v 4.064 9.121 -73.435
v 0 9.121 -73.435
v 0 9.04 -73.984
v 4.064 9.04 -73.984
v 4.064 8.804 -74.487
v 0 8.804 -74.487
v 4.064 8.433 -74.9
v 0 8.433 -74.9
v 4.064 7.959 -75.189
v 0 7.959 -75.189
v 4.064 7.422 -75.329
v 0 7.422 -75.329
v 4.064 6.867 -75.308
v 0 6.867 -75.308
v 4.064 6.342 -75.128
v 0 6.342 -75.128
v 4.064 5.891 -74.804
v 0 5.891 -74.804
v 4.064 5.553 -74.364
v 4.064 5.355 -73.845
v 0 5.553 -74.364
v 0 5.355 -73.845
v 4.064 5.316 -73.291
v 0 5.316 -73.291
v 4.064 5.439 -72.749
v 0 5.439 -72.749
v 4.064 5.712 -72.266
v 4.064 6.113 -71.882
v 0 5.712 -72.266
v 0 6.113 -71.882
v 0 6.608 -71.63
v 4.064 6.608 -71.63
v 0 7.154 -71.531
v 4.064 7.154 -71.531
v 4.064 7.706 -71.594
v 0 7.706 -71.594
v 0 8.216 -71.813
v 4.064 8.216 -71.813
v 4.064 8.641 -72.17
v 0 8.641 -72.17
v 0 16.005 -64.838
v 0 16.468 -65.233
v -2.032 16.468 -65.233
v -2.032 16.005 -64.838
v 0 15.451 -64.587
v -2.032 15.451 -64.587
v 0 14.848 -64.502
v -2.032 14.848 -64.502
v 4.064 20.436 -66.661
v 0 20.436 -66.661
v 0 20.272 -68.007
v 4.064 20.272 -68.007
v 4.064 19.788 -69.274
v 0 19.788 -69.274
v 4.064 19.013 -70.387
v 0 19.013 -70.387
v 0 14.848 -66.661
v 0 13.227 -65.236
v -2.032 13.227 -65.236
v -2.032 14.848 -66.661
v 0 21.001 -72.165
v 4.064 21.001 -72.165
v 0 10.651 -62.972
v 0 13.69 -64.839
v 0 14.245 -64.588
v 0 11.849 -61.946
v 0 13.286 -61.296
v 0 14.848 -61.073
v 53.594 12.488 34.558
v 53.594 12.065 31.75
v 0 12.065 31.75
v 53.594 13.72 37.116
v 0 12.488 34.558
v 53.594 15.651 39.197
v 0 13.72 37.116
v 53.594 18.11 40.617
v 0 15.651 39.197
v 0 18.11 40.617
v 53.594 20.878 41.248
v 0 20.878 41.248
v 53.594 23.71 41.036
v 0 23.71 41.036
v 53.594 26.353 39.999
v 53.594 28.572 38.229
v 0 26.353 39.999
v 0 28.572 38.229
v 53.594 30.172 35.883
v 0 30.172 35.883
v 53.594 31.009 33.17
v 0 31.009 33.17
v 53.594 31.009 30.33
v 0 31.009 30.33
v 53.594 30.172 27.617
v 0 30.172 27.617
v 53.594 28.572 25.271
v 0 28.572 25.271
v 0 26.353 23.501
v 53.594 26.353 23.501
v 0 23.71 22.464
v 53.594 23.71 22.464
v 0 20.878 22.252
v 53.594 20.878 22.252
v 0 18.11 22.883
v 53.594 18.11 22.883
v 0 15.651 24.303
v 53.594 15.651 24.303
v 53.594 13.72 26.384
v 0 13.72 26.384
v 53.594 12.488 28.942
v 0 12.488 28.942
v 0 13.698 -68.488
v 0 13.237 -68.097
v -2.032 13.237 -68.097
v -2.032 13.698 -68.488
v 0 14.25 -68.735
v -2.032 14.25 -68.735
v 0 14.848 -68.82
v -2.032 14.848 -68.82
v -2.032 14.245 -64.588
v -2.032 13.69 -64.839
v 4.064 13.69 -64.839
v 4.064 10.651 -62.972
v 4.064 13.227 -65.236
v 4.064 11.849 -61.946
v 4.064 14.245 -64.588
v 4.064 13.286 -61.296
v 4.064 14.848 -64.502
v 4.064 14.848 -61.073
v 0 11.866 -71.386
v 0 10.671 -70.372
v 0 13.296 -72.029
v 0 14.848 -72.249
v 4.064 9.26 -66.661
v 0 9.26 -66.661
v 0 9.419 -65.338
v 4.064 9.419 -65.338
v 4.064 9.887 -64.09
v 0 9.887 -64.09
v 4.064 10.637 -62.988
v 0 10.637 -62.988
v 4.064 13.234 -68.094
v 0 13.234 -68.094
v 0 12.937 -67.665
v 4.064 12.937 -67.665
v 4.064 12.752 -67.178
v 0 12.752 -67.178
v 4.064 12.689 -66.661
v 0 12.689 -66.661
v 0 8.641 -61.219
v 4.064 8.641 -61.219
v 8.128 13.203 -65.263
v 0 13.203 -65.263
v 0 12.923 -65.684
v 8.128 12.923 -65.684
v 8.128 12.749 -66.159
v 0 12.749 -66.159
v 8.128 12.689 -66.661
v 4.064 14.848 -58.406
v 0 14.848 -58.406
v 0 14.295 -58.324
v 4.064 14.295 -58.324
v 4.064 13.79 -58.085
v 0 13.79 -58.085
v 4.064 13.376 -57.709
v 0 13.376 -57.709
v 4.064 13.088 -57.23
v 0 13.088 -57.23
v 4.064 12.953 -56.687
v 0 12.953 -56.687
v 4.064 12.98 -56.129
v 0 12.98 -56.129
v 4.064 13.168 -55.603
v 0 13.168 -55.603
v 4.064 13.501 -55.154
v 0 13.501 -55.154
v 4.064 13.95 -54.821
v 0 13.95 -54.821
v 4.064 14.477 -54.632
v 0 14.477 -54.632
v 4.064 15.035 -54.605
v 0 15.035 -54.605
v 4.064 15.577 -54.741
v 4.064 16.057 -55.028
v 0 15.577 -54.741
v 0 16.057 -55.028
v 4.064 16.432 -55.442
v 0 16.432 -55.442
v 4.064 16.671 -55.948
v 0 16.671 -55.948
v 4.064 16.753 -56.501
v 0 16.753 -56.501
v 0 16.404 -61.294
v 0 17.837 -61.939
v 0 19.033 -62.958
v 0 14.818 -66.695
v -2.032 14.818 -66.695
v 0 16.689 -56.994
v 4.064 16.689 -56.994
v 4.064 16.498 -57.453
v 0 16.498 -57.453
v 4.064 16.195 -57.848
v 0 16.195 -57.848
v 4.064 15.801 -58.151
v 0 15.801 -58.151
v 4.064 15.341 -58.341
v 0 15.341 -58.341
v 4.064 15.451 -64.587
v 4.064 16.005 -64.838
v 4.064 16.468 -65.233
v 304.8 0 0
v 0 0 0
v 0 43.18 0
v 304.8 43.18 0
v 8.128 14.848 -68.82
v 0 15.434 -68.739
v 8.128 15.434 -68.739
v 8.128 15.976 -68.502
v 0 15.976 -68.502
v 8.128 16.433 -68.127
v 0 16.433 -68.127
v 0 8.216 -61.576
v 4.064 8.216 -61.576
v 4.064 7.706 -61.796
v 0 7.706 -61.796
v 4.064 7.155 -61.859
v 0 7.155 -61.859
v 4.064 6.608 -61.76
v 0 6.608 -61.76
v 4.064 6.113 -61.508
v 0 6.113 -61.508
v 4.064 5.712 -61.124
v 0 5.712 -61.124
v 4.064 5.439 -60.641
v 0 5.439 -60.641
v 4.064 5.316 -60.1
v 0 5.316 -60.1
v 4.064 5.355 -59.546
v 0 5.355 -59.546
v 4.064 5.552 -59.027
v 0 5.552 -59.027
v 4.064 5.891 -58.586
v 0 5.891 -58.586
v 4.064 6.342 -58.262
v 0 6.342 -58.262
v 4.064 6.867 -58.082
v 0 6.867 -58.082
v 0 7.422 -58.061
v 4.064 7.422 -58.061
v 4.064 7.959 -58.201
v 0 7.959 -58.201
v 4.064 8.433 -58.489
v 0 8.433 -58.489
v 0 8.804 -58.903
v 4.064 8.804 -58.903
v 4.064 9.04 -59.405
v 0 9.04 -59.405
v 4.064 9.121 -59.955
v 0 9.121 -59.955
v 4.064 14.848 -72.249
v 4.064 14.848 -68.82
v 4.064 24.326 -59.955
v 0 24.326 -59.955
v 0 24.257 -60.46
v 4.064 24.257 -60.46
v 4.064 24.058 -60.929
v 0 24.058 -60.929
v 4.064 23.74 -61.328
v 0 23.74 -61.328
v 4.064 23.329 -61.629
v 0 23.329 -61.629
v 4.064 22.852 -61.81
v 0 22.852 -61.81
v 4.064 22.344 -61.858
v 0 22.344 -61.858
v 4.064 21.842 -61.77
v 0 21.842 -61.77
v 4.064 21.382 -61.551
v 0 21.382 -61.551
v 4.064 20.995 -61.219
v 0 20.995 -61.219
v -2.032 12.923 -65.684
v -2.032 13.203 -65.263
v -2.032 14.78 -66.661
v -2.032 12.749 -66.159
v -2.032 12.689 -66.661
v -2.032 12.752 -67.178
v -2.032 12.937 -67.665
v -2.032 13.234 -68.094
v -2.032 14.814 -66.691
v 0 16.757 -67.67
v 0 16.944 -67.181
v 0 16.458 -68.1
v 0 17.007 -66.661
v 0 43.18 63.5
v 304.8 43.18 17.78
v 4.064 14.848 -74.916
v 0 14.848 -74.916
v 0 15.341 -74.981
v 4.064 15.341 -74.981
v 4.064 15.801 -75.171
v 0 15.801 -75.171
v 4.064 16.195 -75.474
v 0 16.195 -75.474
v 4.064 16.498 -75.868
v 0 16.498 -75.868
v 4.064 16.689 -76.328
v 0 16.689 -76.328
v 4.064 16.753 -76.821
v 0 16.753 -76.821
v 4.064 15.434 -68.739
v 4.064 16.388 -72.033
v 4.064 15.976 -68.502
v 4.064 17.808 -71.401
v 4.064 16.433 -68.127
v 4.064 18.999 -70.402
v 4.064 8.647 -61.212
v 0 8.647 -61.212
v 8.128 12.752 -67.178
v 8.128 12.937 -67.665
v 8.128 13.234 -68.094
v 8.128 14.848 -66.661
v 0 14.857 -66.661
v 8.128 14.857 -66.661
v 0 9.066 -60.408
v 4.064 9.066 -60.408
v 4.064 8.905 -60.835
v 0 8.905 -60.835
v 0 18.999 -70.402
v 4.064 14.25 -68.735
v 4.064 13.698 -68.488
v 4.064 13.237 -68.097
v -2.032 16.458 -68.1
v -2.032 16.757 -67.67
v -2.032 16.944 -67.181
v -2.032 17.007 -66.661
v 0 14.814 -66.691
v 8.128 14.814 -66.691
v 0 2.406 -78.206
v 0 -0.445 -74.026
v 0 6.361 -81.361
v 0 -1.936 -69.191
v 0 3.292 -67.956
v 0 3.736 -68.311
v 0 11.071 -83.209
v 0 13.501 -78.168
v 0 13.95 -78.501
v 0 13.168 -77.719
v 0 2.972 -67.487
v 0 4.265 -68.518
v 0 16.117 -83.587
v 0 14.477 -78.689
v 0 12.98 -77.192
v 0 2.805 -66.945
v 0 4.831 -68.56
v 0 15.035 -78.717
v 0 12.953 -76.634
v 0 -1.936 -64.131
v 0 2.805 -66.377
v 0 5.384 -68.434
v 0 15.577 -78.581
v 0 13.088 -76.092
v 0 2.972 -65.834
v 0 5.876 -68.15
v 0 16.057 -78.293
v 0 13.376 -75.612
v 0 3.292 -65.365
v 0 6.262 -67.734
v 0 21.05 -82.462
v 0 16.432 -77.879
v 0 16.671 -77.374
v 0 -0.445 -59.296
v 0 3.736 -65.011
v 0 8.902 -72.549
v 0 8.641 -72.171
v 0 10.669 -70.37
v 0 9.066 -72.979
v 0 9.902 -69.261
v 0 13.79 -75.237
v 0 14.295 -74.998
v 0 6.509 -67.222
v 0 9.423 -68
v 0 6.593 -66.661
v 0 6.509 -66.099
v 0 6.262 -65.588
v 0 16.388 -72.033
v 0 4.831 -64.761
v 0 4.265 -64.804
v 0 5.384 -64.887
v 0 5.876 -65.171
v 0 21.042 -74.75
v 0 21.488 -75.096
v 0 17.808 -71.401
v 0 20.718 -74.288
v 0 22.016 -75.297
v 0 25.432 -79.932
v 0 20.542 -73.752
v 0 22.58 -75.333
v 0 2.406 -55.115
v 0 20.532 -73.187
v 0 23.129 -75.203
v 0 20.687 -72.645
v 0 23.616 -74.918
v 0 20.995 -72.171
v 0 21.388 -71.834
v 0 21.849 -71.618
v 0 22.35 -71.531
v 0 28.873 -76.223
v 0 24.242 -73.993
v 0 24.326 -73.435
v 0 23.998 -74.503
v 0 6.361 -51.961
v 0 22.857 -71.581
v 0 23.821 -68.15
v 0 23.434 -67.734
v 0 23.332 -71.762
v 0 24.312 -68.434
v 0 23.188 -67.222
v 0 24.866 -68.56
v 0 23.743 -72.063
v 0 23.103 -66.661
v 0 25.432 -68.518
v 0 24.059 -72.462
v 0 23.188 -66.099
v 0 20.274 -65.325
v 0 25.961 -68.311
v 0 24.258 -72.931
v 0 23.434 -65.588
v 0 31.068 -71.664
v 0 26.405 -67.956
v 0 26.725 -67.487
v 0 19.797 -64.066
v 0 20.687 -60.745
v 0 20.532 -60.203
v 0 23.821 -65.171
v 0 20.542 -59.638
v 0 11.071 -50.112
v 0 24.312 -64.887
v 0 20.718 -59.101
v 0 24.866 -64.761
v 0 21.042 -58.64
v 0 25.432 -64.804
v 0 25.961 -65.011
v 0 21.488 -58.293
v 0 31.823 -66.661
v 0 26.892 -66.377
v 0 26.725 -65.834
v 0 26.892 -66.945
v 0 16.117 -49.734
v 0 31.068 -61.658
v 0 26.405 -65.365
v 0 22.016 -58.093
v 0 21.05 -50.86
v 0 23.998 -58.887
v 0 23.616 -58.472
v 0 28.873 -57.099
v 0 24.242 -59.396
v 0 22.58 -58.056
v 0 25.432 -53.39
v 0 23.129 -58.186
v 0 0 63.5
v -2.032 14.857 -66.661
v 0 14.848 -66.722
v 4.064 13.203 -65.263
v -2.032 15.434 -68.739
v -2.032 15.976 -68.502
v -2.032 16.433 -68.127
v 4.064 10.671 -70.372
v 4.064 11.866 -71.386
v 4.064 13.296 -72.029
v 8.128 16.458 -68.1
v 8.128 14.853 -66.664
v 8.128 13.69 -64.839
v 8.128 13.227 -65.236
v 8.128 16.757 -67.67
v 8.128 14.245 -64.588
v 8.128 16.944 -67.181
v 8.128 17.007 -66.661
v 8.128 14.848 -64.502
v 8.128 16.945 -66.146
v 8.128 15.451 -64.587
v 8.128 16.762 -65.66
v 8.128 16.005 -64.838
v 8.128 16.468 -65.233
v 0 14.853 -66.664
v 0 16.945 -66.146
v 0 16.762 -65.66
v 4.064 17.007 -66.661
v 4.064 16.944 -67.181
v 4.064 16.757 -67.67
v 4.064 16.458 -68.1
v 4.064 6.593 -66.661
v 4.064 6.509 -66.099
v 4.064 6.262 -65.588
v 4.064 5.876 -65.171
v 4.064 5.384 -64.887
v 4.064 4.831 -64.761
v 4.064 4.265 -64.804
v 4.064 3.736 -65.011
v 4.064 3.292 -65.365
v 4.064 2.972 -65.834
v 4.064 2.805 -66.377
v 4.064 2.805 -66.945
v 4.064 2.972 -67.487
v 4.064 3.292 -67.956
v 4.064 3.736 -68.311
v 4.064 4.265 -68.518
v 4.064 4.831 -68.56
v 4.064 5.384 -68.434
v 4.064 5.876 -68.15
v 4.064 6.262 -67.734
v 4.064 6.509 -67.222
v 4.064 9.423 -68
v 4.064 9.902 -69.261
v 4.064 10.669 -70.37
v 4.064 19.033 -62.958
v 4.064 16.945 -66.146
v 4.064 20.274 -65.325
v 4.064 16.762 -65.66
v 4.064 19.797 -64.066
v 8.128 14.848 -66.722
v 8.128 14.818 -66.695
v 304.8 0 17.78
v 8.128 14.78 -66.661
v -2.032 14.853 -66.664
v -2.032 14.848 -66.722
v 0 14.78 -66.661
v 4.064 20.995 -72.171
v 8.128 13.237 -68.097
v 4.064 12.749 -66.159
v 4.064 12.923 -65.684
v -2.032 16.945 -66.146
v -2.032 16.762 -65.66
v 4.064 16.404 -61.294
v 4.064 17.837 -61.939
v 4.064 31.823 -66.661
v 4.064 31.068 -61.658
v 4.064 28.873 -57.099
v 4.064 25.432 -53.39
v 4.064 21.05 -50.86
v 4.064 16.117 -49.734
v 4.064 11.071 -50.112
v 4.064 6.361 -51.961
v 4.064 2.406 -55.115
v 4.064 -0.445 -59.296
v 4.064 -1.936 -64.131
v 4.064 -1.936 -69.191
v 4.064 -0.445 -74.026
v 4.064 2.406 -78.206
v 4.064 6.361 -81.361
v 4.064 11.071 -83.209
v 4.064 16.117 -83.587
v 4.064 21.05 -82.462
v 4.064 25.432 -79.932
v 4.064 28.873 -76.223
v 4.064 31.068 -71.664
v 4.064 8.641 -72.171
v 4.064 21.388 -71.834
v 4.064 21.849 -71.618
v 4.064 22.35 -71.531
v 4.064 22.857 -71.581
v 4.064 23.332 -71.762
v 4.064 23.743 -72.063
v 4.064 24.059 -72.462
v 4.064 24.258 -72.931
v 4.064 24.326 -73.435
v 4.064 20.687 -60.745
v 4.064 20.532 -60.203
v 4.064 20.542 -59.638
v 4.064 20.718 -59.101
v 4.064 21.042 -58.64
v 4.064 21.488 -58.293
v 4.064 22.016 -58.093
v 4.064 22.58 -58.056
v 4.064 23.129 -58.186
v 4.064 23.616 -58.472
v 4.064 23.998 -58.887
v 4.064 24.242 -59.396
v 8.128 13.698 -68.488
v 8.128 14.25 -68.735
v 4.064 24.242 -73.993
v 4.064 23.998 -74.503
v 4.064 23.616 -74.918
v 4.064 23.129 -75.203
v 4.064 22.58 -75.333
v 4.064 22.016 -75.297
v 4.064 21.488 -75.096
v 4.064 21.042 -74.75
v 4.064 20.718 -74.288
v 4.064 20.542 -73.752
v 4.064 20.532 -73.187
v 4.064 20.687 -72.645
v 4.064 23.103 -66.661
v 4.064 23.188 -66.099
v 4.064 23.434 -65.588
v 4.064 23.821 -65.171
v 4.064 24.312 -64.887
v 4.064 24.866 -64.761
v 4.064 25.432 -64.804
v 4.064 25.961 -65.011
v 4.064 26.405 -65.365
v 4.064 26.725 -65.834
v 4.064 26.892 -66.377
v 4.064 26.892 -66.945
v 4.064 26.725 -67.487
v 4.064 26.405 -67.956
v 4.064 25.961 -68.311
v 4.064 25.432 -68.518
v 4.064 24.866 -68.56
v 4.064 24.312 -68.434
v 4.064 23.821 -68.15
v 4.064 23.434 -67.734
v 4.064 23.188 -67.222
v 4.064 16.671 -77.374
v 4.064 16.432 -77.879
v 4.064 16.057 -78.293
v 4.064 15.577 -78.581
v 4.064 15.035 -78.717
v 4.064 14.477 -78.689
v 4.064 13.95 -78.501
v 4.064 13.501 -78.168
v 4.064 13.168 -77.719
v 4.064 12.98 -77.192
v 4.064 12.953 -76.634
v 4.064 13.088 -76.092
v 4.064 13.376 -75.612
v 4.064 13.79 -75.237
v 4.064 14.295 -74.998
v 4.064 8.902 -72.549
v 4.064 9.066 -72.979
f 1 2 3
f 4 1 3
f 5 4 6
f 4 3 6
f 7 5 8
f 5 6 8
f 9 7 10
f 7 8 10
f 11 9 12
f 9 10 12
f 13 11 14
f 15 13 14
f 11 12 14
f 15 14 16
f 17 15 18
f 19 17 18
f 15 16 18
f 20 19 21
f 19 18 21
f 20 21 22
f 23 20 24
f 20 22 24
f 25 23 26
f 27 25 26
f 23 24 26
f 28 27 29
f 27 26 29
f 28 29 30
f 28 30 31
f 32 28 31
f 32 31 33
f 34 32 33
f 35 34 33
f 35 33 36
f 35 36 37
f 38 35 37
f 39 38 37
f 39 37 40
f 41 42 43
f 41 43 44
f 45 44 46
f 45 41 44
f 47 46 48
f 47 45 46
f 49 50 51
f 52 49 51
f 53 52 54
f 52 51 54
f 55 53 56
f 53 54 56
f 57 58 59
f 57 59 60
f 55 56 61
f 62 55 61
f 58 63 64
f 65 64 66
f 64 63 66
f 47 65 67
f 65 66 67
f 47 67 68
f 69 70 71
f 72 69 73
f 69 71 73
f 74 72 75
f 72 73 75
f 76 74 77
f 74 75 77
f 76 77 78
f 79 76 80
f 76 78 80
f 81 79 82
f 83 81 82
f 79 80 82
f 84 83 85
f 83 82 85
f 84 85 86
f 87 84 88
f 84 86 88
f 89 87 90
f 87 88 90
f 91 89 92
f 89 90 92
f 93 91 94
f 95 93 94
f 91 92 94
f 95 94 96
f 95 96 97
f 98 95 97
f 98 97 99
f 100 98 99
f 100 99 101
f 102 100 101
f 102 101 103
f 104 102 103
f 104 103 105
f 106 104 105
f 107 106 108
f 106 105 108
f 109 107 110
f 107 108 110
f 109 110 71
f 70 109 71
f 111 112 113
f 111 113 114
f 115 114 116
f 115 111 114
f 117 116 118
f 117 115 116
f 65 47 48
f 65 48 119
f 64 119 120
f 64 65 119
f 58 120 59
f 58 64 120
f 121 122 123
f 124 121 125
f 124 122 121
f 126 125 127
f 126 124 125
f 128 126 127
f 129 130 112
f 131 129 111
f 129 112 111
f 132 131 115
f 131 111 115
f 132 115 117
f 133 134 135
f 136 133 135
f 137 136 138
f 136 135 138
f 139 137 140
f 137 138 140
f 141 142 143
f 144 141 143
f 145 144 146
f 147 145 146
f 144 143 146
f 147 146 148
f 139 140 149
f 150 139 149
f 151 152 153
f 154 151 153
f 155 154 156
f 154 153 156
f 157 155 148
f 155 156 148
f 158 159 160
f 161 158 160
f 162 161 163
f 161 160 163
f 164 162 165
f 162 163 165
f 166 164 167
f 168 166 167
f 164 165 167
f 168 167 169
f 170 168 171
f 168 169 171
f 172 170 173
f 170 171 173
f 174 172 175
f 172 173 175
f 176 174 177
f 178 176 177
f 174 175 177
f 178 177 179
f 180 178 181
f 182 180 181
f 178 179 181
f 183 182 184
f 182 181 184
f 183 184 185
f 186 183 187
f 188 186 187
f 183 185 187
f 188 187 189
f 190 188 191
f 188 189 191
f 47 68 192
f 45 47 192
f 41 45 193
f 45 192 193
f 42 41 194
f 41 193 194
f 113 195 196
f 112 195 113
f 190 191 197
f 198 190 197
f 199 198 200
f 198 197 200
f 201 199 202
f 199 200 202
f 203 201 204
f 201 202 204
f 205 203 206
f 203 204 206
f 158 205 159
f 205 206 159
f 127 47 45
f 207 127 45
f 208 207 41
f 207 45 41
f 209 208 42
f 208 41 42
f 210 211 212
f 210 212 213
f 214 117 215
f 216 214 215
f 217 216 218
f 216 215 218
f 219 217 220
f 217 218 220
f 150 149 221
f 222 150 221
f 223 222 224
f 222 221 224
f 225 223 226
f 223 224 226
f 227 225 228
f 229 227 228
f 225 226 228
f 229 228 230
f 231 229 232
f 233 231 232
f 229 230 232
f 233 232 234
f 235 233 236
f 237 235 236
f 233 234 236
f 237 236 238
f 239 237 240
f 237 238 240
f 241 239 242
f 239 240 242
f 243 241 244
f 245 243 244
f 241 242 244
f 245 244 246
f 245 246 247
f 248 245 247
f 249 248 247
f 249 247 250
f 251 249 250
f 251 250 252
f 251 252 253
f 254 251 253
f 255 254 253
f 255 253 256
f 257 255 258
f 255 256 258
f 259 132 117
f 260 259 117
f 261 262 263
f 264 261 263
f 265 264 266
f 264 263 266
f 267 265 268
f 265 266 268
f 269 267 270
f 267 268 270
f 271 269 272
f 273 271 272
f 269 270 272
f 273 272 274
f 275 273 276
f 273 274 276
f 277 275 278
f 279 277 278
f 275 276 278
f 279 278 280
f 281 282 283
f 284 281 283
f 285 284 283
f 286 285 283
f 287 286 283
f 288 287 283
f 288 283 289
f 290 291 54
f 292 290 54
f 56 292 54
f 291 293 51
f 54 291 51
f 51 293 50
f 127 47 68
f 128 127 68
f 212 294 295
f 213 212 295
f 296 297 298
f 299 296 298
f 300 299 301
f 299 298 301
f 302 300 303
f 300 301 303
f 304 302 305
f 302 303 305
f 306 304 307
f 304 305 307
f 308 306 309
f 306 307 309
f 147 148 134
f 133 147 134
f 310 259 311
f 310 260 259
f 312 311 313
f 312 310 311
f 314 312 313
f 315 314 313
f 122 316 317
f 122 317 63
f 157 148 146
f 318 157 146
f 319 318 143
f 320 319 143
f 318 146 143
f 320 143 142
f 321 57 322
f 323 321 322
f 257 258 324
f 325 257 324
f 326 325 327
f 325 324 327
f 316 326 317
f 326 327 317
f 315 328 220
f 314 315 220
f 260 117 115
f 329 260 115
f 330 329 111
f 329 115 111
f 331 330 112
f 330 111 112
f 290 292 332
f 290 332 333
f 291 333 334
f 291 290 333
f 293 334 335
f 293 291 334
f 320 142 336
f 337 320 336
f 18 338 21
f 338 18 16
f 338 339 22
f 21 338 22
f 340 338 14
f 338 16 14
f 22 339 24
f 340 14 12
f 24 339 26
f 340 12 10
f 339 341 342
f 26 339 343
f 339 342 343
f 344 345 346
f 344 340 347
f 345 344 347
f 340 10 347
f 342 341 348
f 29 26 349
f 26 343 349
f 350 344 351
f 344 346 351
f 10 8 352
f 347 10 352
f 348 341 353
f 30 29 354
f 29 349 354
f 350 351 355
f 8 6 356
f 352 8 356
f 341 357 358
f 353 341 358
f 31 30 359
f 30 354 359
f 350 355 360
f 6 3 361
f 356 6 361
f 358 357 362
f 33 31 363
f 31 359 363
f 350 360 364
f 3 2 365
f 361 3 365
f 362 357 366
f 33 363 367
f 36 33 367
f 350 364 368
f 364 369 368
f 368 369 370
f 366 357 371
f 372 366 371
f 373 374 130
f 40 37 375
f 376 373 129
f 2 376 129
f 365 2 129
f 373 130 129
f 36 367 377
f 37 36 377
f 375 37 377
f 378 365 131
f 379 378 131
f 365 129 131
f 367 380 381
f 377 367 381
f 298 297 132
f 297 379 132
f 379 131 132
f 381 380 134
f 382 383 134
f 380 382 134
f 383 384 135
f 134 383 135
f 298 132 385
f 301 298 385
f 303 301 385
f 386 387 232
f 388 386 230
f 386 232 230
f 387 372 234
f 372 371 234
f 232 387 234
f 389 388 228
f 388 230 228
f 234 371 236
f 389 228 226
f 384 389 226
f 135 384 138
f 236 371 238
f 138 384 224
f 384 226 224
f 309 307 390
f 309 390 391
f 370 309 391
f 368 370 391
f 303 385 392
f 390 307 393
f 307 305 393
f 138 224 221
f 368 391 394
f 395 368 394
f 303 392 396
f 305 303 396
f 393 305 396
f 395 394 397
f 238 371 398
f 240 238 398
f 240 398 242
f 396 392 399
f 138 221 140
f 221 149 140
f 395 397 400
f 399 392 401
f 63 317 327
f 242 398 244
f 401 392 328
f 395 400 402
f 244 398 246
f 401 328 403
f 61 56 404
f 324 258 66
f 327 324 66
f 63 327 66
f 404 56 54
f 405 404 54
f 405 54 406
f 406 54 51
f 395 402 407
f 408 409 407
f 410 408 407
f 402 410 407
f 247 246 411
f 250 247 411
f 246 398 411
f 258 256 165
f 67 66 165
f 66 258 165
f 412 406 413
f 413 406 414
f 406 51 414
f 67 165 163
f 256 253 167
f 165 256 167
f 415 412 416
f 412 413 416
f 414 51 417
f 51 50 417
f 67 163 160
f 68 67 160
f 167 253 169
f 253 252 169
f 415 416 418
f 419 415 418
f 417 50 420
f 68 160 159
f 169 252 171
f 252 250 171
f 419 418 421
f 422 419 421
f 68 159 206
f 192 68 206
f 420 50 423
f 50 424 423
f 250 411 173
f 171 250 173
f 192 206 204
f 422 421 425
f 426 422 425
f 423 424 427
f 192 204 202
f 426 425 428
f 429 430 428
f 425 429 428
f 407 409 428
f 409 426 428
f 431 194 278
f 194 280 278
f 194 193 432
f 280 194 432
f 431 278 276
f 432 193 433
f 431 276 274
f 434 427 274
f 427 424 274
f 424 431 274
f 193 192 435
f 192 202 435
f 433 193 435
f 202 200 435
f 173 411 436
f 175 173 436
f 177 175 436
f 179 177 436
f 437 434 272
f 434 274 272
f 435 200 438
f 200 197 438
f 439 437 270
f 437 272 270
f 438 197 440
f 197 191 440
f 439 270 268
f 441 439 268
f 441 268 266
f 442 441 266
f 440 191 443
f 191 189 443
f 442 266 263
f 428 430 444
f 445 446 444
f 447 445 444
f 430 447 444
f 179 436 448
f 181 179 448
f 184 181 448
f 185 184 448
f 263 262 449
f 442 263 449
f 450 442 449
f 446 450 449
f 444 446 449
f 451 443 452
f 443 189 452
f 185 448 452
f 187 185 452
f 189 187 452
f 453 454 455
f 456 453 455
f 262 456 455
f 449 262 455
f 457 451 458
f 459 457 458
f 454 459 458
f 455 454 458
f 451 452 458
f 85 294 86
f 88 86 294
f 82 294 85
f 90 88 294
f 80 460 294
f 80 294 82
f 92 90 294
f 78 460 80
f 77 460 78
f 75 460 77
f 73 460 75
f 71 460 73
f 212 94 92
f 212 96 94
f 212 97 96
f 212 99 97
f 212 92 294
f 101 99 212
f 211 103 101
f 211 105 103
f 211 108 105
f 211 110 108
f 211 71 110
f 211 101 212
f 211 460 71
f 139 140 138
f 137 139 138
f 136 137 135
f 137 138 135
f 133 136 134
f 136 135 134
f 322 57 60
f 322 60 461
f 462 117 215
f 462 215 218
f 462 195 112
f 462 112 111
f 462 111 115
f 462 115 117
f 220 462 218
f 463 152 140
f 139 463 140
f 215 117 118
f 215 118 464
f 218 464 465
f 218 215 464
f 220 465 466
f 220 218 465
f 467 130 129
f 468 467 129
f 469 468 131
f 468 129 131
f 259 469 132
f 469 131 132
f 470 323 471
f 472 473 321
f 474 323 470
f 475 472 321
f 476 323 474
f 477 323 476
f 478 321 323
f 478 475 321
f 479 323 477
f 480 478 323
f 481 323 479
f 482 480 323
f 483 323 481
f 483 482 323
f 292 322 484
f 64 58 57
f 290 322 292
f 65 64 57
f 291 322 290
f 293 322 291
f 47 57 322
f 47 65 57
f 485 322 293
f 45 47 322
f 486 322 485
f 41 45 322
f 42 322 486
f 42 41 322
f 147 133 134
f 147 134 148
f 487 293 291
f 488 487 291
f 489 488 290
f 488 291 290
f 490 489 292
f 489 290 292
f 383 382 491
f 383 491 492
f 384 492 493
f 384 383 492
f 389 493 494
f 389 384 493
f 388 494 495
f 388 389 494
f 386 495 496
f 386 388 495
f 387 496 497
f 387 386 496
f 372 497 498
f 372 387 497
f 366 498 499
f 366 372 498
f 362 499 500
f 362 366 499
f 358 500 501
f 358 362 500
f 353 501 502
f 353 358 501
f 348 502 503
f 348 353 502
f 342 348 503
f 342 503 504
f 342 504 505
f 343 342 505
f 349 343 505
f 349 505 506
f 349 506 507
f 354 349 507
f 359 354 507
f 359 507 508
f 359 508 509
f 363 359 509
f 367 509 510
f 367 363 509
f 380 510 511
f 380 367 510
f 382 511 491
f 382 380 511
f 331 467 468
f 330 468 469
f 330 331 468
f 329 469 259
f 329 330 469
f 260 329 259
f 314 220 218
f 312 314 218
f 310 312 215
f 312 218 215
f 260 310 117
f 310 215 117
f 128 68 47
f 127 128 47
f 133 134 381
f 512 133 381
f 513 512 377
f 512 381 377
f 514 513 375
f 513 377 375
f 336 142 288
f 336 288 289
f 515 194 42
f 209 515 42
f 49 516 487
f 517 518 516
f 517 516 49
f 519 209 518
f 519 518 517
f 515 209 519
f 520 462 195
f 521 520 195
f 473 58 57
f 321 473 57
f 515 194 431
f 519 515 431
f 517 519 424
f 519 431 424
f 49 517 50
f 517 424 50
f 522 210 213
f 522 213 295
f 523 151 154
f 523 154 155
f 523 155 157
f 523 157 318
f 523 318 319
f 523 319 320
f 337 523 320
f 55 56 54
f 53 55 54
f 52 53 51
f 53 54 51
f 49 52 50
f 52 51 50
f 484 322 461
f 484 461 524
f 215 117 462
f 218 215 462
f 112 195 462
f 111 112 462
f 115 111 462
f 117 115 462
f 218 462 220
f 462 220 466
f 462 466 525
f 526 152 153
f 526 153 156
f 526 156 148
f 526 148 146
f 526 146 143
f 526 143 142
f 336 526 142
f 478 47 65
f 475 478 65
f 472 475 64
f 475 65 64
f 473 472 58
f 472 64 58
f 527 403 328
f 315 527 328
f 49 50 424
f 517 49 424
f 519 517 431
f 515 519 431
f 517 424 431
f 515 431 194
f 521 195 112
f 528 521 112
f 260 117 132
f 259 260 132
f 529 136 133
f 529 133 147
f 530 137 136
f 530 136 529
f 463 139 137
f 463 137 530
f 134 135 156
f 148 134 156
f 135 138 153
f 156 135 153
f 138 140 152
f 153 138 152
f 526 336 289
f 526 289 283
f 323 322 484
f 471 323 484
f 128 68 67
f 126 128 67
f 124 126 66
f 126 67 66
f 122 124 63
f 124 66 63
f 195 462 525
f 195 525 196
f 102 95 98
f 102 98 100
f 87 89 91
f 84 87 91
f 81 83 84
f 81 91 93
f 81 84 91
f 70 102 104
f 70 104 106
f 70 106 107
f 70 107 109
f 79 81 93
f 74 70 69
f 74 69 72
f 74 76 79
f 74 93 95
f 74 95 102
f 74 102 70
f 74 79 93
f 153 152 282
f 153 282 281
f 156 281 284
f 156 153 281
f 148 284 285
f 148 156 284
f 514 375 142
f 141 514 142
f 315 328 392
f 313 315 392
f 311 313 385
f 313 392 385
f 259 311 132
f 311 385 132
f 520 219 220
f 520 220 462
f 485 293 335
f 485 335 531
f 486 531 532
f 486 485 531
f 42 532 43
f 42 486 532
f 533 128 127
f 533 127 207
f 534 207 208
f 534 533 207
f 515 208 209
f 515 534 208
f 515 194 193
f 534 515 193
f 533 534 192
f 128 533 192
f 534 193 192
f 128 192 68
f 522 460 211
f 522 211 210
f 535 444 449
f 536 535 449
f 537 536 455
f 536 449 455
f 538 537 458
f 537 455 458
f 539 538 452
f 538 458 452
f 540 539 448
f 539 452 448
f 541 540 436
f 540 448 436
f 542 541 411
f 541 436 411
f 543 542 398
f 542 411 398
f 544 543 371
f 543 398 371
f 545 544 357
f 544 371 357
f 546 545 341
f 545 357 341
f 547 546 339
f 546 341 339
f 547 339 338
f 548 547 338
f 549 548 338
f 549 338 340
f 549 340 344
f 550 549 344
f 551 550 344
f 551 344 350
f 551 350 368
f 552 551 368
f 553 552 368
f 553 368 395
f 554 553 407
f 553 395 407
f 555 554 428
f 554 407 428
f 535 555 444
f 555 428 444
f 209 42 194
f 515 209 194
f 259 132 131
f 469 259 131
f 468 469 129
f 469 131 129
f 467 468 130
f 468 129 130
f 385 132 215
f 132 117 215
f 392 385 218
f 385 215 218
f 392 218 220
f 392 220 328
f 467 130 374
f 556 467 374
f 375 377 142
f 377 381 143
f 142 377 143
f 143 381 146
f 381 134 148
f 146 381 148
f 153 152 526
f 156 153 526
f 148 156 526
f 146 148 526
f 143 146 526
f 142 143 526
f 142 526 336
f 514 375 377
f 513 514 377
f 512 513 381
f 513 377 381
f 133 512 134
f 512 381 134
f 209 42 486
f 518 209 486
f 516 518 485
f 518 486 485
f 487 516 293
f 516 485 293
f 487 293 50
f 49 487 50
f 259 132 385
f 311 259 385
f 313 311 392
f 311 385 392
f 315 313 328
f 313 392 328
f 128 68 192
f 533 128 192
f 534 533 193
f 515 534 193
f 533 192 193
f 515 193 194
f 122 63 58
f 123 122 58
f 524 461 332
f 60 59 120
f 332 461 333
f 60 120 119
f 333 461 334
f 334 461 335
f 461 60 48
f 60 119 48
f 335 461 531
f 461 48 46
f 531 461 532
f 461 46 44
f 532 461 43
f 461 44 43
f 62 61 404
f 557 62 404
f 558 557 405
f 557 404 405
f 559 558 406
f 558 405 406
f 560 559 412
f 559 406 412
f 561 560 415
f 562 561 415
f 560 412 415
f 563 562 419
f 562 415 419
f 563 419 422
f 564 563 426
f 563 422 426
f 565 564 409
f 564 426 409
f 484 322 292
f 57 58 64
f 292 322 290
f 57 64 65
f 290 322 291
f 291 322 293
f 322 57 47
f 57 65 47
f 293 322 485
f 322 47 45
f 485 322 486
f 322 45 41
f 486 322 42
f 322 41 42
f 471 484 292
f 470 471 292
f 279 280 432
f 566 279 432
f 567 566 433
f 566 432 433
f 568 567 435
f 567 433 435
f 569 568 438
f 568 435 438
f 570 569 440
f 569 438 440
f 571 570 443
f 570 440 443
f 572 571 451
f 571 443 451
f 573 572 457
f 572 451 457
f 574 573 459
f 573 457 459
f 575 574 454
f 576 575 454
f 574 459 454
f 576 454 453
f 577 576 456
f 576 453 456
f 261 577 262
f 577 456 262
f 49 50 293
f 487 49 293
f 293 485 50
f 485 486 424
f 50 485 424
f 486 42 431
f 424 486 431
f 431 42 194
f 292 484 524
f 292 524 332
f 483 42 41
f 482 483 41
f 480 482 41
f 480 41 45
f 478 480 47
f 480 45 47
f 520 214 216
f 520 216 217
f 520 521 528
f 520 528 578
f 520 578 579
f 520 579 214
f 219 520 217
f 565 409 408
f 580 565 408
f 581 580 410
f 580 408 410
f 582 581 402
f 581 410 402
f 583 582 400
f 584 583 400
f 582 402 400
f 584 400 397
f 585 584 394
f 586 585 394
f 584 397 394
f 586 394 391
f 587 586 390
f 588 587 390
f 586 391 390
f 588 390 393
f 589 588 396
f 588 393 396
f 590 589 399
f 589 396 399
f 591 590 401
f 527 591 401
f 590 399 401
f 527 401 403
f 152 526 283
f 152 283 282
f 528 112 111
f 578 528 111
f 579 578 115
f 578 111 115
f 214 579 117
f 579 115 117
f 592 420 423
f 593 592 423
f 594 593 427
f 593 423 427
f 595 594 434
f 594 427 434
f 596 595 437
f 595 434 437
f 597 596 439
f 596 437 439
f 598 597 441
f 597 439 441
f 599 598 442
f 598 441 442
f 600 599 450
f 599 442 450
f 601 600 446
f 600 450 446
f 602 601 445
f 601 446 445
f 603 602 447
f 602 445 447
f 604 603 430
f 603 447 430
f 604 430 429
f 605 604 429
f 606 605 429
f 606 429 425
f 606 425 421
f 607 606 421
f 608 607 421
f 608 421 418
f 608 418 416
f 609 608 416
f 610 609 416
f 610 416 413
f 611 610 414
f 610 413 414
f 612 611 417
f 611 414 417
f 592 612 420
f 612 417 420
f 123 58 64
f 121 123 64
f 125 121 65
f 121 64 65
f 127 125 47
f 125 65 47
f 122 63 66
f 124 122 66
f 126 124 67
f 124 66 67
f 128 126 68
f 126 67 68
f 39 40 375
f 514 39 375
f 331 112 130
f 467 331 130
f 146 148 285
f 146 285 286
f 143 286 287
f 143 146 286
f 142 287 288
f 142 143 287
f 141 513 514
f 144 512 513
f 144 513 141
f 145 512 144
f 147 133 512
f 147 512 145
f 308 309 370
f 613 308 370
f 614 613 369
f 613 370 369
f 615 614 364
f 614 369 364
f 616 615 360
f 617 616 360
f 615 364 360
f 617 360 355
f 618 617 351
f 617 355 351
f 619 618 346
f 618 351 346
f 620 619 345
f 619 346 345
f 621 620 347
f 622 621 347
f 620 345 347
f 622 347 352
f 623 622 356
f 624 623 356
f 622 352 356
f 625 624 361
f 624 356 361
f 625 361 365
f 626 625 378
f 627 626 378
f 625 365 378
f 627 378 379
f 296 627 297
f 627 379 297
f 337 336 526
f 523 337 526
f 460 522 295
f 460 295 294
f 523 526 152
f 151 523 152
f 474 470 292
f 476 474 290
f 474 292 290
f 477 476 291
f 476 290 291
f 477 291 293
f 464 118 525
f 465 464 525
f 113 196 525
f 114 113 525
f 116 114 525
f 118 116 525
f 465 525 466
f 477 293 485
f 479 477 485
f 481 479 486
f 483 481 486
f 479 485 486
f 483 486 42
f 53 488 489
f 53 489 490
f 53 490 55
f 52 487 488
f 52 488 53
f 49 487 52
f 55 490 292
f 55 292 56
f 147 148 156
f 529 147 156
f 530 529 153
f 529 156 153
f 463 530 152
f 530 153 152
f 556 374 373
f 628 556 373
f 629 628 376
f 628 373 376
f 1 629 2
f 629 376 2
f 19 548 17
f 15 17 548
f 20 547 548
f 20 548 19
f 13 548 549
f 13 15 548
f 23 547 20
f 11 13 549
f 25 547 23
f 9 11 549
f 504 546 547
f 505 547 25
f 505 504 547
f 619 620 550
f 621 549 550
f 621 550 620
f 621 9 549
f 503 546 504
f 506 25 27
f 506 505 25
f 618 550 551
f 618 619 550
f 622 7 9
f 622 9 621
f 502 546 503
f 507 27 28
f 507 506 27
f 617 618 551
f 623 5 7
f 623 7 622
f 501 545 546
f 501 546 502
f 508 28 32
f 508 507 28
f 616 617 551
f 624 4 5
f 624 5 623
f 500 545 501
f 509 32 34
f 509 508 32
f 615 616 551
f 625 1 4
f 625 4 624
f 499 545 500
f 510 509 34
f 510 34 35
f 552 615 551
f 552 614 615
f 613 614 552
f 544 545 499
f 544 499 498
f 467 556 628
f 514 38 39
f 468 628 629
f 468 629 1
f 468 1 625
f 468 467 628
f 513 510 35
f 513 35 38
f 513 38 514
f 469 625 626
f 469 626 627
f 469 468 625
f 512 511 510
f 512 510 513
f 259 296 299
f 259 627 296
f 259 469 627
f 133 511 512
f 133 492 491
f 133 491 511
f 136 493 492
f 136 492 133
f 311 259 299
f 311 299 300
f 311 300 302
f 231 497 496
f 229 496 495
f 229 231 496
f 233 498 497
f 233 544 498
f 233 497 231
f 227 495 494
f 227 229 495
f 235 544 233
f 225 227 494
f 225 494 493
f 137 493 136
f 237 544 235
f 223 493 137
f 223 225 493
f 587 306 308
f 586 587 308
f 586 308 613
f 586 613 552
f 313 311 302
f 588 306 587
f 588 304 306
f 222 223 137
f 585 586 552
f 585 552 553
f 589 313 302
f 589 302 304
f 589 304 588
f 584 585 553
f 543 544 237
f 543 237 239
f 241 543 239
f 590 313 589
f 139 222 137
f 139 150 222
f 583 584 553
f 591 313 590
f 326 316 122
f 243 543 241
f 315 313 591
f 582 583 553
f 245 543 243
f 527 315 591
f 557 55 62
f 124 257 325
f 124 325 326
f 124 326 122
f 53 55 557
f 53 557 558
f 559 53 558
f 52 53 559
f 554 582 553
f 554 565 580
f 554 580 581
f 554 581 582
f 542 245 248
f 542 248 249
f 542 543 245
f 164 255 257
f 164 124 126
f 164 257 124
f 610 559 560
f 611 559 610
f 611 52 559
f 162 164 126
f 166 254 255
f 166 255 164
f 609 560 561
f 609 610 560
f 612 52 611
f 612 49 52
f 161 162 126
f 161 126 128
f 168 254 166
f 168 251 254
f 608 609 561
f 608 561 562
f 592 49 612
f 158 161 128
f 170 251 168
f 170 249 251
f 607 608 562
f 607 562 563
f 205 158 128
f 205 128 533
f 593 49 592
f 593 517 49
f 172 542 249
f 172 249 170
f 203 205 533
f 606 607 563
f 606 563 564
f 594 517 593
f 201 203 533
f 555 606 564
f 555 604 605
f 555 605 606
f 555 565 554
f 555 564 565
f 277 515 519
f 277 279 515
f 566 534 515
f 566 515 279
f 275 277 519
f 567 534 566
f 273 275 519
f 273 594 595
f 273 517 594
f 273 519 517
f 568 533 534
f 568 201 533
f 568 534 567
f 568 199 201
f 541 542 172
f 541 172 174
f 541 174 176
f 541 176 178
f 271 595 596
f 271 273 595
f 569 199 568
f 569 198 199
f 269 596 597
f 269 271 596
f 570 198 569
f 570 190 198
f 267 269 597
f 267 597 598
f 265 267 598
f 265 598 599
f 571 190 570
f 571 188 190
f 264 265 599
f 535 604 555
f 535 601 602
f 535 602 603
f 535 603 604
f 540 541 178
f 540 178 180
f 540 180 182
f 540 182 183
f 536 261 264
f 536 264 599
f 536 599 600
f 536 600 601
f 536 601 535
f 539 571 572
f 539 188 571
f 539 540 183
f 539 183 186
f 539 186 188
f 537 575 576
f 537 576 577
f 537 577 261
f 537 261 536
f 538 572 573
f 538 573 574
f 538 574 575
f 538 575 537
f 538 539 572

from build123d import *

# Parameters (mm, degrees)
F1_DEPTH  = 43.18
F2_R      = 9.525
F3_DEPTH  = 53.594
F5_DEPTH  = 8.128
F4_R      = 16.9741536912
F4_R_2    = 1.905
F6_DEPTH  = 4.064
F7_DEPTH  = 4.064
F8_DEPTH  = 4.064
F9_DEPTH  = 4.064
F10_DEPTH = 4.064
F11_DEPTH = 4.064
F12_DEPTH = 4.064
F13_DEPTH = 4.064
F14_DEPTH = 4.064
F15_DEPTH = 2.032


with BuildPart() as f1:
    # F0 (on Front) → F1 (new body)
    with BuildSketch(Plane.XZ):
        Polygon((0, 63.5), (0, 0), (304.8, 0), (304.8, 17.78), align=None)
    extrude(amount=-F1_DEPTH)

    # F2 (on face) → F3 (cut)
    with BuildSketch(Plane(origin=(0, 0, 0), x_dir=(0, -1, 0), z_dir=(-1, 0, 0))):
        with Locations((-21.59, 31.75)):
            Circle(F2_R)
    extrude(amount=-F3_DEPTH, mode=Mode.SUBTRACT)


with BuildPart() as f5:
    # F4 (on Right) → F5 (new body)
    with BuildSketch(Plane.YZ):
        with BuildLine():
            ThreePointArc((14.8484487383, -68.8197386136), (15.7133385968, -68.6389313577), (16.43336661, -68.1267932988))
            Line((16.43336661, -68.1267932988), (14.8484487383, -66.7216335196))
            Line((14.8484487383, -66.7216335196), (14.8484487383, -68.8197386136))
        make_face()
        with BuildLine():
            ThreePointArc((13.2366369691, -68.0971730258), (13.9652672439, -68.6308328875), (14.8484487383, -68.8197386136))
            Line((14.8484487383, -68.8197386136), (14.8484487383, -66.7216335196))
            Line((14.8484487383, -66.7216335196), (14.8182970344, -66.6949015593))
            Line((14.8182970344, -66.6949015593), (13.2366369691, -68.0971730258))
        make_face()
    extrude(amount=F5_DEPTH)


with BuildPart() as f5b:
    # F4 (on Right) → F5, piece 2 (new body)
    with BuildSketch(Plane.YZ):
        with BuildLine():
            Line((14.8141250754, -66.6912027752), (14.7797637203, -66.6607386136))
            Line((14.7797637203, -66.6607386136), (12.6894487383, -66.6607386136))
            ThreePointArc((12.6894487383, -66.6607386136), (12.8300988197, -67.4272531966), (13.2337235006, -68.0938971557))
            Line((13.2337235006, -68.0938971557), (14.8141250754, -66.6912027752))
        make_face()
        with BuildLine():
            Line((12.6894487383, -66.6607386136), (14.7797637203, -66.6607386136))
            Line((14.7797637203, -66.6607386136), (13.203074548, -65.2628742518))
            ThreePointArc((13.203074548, -65.2628742518), (12.8219192077, -65.9161185349), (12.6894487383, -66.6607386136))
        make_face()
    extrude(amount=F5_DEPTH)


with BuildPart() as f5c:
    # F4 (on Right) → F5, piece 3 (new body)
    with BuildSketch(Plane.YZ):
        with BuildLine():
            Line((14.8484487383, -66.6607386136), (14.8484487383, -64.5017386136))
            ThreePointArc((14.8484487383, -64.5017386136), (13.9583180842, -64.6937743489), (13.2265356419, -65.2357196987))
            Line((13.2265356419, -65.2357196987), (14.8484487383, -66.6607386136))
        make_face()
        with BuildLine():
            Line((14.8568303485, -66.6607386136), (16.4676379723, -65.2326254442))
            ThreePointArc((16.4676379723, -65.2326254442), (15.7367011425, -64.692925445), (14.8484487383, -64.5017386136))
            Line((14.8484487383, -64.5017386136), (14.8484487383, -66.6607386136))
            Line((14.8484487383, -66.6607386136), (14.8568303485, -66.6607386136))
        make_face()
        with BuildLine():
            Line((14.8568303485, -66.6607386136), (17.0074487383, -66.6607386136))
            ThreePointArc((17.0074487383, -66.6607386136), (16.8679920723, -65.8973738764), (16.4676379723, -65.2326254442))
            Line((16.4676379723, -65.2326254442), (14.8568303485, -66.6607386136))
        make_face()
        with BuildLine():
            ThreePointArc((16.4575149968, -68.1002478271), (16.8652847569, -67.431227727), (17.0074487383, -66.6607386136))
            Line((17.0074487383, -66.6607386136), (14.8568303485, -66.6607386136))
            Line((14.8568303485, -66.6607386136), (14.8526206226, -66.6644708812))
            Line((14.8526206226, -66.6644708812), (16.4575149968, -68.1002478271))
        make_face()
    extrude(amount=F5_DEPTH)


with BuildPart() as f6:
    # F4 (on Right) → F6 (new body)
    with BuildSketch(Plane.YZ):
        with Locations((14.8484487383, -66.6607386136)):
            Circle(F4_R)
        with BuildLine():
            ThreePointArc((19.0334446835, -62.9578271998), (20.0739392101, -64.680841311), (20.4364487383, -66.6607386136))
            ThreePointArc((20.4364487383, -66.6607386136), (20.0684949042, -68.6549457307), (19.0130908192, -70.3865271661))
            Line((19.0130908192, -70.3865271661), (21.000913203, -72.1648806808))
            ThreePointArc((21.000913203, -72.1648806808), (23.1005208841, -71.6554746762), (24.3256775488, -73.4350358691))
            ThreePointArc((24.3256775488, -73.4350358691), (21.744826341, -75.2161170422), (20.9952312023, -72.171260686))
            Line((20.9952312023, -72.171260686), (18.9993908505, -70.4017844007))
            ThreePointArc((18.9993908505, -70.4017844007), (17.1200979346, -71.7661625851), (14.8484487383, -72.2487386136))
            ThreePointArc((14.8484487383, -72.2487386136), (12.5585387057, -71.7579982737), (10.6708302578, -70.3719712702))
            Line((10.6708302578, -70.3719712702), (8.6413628665, -72.171260686))
            ThreePointArc((8.6413628665, -72.171260686), (8.9969976931, -72.7591846614), (9.1209165201, -73.4350358691))
            ThreePointArc((9.1209165201, -73.4350358691), (5.435019533, -74.1113722659), (8.6406740827, -72.1704842144))
            Line((8.6406740827, -72.1704842144), (10.6691598878, -70.3700901343))
            ThreePointArc((10.6691598878, -70.3700901343), (9.624484243, -68.6446587107), (9.2604487383, -66.6607386136))
            ThreePointArc((9.2604487383, -66.6607386136), (9.6159044991, -64.6995591765), (10.6370503075, -62.9878831499))
            Line((10.6370503075, -62.9878831499), (8.6413628665, -61.2185424325))
            ThreePointArc((8.6413628665, -61.2185424325), (5.434835347, -59.2789160417), (9.1209165201, -59.9547672494))
            ThreePointArc((9.1209165201, -59.9547672494), (8.9985087479, -60.6266228508), (8.647016311, -61.2121368802))
            Line((8.647016311, -61.2121368802), (10.6505560183, -62.9724543633))
            ThreePointArc((10.6505560183, -62.9724543633), (12.544581163, -61.5697722814), (14.8484487383, -61.0727386136))
            ThreePointArc((14.8484487383, -61.0727386136), (17.1434296772, -61.5657600572), (19.0334446835, -62.9578271998))
        make_face(mode=Mode.SUBTRACT)
        with BuildLine():
            ThreePointArc((16.7534487383, -76.8207386136), (13.5014103201, -78.1677770318), (14.8484487383, -74.9157386136))
            ThreePointArc((14.8484487383, -74.9157386136), (16.1954871565, -75.4737001954), (16.7534487383, -76.8207386136))
        make_face(mode=Mode.SUBTRACT)
        with Locations((4.6884487383, -66.6607386136)):
            Circle(F4_R_2, mode=Mode.SUBTRACT)
        with BuildLine():
            ThreePointArc((24.3256775488, -59.9547672494), (23.0965287565, -61.7358484225), (20.9952312023, -61.2185424325))
            ThreePointArc((20.9952312023, -61.2185424325), (21.744826341, -58.1736860764), (24.3256775488, -59.9547672494))
        make_face(mode=Mode.SUBTRACT)
        with BuildLine():
            ThreePointArc((26.9134487383, -66.6607386136), (25.0084487383, -68.5657386136), (23.1034487383, -66.6607386136))
            ThreePointArc((23.1034487383, -66.6607386136), (25.0084487383, -64.7557386136), (26.9134487383, -66.6607386136))
        make_face(mode=Mode.SUBTRACT)
        with BuildLine():
            ThreePointArc((16.7534487383, -56.5007386136), (16.1954871565, -57.8477770318), (14.8484487383, -58.4057386136))
            ThreePointArc((14.8484487383, -58.4057386136), (13.5014103201, -55.1537001954), (16.7534487383, -56.5007386136))
        make_face(mode=Mode.SUBTRACT)
    extrude(amount=F6_DEPTH)


with BuildPart() as f7:
    # F4 (on Right) → F7 (new body)
    with BuildSketch(Plane.YZ):
        with BuildLine():
            ThreePointArc((10.6708302578, -70.3719712702), (12.5585387057, -71.7579982737), (14.8484487383, -72.2487386136))
            Line((14.8484487383, -72.2487386136), (14.8484487383, -68.8197386136))
            ThreePointArc((14.8484487383, -68.8197386136), (13.9652672439, -68.6308328875), (13.2366369691, -68.0971730258))
            Line((13.2366369691, -68.0971730258), (10.6708302578, -70.3719712702))
        make_face()
    extrude(amount=F7_DEPTH)


with BuildPart() as f8:
    # F4 (on Right) → F8 (new body)
    with BuildSketch(Plane.YZ):
        with BuildLine():
            ThreePointArc((14.8484487383, -72.2487386136), (17.1200979346, -71.7661625851), (18.9993908505, -70.4017844007))
            Line((18.9993908505, -70.4017844007), (16.43336661, -68.1267932988))
            ThreePointArc((16.43336661, -68.1267932988), (15.7133385968, -68.6389313577), (14.8484487383, -68.8197386136))
            Line((14.8484487383, -68.8197386136), (14.8484487383, -72.2487386136))
        make_face()
    extrude(amount=F8_DEPTH)


with BuildPart() as f9:
    # F4 (on Right) → F9 (new body)
    with BuildSketch(Plane.YZ):
        with BuildLine():
            Line((17.0074487383, -66.6607386136), (20.4364487383, -66.6607386136))
            ThreePointArc((20.4364487383, -66.6607386136), (20.0739392101, -64.680841311), (19.0334446835, -62.9578271998))
            Line((19.0334446835, -62.9578271998), (16.4676379723, -65.2326254442))
            ThreePointArc((16.4676379723, -65.2326254442), (16.8679920723, -65.8973738764), (17.0074487383, -66.6607386136))
        make_face()
    extrude(amount=F9_DEPTH)


with BuildPart() as f10:
    # F4 (on Right) → F10 (new body)
    with BuildSketch(Plane.YZ):
        with BuildLine():
            ThreePointArc((19.0130908192, -70.3865271661), (20.0684949042, -68.6549457307), (20.4364487383, -66.6607386136))
            Line((20.4364487383, -66.6607386136), (17.0074487383, -66.6607386136))
            ThreePointArc((17.0074487383, -66.6607386136), (16.8652847569, -67.431227727), (16.4575149968, -68.1002478271))
            Line((16.4575149968, -68.1002478271), (19.0130908192, -70.3865271661))
        make_face()
    extrude(amount=F10_DEPTH)


with BuildPart() as f11:
    # F4 (on Right) → F11 (new body)
    with BuildSketch(Plane.YZ):
        with BuildLine():
            Line((14.8484487383, -64.5017386136), (14.8484487383, -61.0727386136))
            ThreePointArc((14.8484487383, -61.0727386136), (12.544581163, -61.5697722814), (10.6505560183, -62.9724543633))
            Line((10.6505560183, -62.9724543633), (13.2265356419, -65.2357196987))
            ThreePointArc((13.2265356419, -65.2357196987), (13.9583180842, -64.6937743489), (14.8484487383, -64.5017386136))
        make_face()
    extrude(amount=F11_DEPTH)


with BuildPart() as f12:
    # F4 (on Right) → F12 (new body)
    with BuildSketch(Plane.YZ):
        with BuildLine():
            Line((16.4676379723, -65.2326254442), (19.0334446835, -62.9578271998))
            ThreePointArc((19.0334446835, -62.9578271998), (17.1434296772, -61.5657600572), (14.8484487383, -61.0727386136))
            Line((14.8484487383, -61.0727386136), (14.8484487383, -64.5017386136))
            ThreePointArc((14.8484487383, -64.5017386136), (15.7367011425, -64.692925445), (16.4676379723, -65.2326254442))
        make_face()
    extrude(amount=F12_DEPTH)


with BuildPart() as f13:
    # F4 (on Right) → F13 (new body)
    with BuildSketch(Plane.YZ):
        with BuildLine():
            Line((13.203074548, -65.2628742518), (10.6370503075, -62.9878831499))
            ThreePointArc((10.6370503075, -62.9878831499), (9.6159044991, -64.6995591765), (9.2604487383, -66.6607386136))
            Line((9.2604487383, -66.6607386136), (12.6894487383, -66.6607386136))
            ThreePointArc((12.6894487383, -66.6607386136), (12.8219192077, -65.9161185349), (13.203074548, -65.2628742518))
        make_face()
    extrude(amount=F13_DEPTH)


with BuildPart() as f14:
    # F4 (on Right) → F14 (new body)
    with BuildSketch(Plane.YZ):
        with BuildLine():
            Line((12.6894487383, -66.6607386136), (9.2604487383, -66.6607386136))
            ThreePointArc((9.2604487383, -66.6607386136), (9.624484243, -68.6446587107), (10.6691598878, -70.3700901343))
            Line((10.6691598878, -70.3700901343), (13.2337235006, -68.0938971557))
            ThreePointArc((13.2337235006, -68.0938971557), (12.8300988197, -67.4272531966), (12.6894487383, -66.6607386136))
        make_face()
    extrude(amount=F14_DEPTH)


with BuildPart() as f15:
    # F15 (new): a face of the model
    f15_faces = [f5c.part.faces().sort_by_distance(p)[0] for p in [
        (0, 15.4545911791, -65.9770540202),
    ]]
    extrude(f15_faces, amount=F15_DEPTH)


with BuildPart() as f15b:
    # F15#2 (new): a face of the model
    f15_2_faces = [f5.part.faces().sort_by_distance(p)[0] for p in [
        (0, 14.8306208917, -67.9502157225),
    ]]
    extrude(f15_2_faces, amount=F15_DEPTH)


with BuildPart() as f15c:
    # F15#3 (new): a face of the model
    f15_3_faces = [f5b.part.faces().sort_by_distance(p)[0] for p in [
        (0, 13.5174077991, -66.6820471258),
    ]]
    extrude(f15_3_faces, amount=F15_DEPTH)


solid = Compound([f1.part, f5.part, f5b.part, f5c.part, f6.part, f7.part, f8.part, f9.part, f10.part, f11.part, f12.part, f13.part, f14.part, f15.part, f15b.part, f15c.part])
